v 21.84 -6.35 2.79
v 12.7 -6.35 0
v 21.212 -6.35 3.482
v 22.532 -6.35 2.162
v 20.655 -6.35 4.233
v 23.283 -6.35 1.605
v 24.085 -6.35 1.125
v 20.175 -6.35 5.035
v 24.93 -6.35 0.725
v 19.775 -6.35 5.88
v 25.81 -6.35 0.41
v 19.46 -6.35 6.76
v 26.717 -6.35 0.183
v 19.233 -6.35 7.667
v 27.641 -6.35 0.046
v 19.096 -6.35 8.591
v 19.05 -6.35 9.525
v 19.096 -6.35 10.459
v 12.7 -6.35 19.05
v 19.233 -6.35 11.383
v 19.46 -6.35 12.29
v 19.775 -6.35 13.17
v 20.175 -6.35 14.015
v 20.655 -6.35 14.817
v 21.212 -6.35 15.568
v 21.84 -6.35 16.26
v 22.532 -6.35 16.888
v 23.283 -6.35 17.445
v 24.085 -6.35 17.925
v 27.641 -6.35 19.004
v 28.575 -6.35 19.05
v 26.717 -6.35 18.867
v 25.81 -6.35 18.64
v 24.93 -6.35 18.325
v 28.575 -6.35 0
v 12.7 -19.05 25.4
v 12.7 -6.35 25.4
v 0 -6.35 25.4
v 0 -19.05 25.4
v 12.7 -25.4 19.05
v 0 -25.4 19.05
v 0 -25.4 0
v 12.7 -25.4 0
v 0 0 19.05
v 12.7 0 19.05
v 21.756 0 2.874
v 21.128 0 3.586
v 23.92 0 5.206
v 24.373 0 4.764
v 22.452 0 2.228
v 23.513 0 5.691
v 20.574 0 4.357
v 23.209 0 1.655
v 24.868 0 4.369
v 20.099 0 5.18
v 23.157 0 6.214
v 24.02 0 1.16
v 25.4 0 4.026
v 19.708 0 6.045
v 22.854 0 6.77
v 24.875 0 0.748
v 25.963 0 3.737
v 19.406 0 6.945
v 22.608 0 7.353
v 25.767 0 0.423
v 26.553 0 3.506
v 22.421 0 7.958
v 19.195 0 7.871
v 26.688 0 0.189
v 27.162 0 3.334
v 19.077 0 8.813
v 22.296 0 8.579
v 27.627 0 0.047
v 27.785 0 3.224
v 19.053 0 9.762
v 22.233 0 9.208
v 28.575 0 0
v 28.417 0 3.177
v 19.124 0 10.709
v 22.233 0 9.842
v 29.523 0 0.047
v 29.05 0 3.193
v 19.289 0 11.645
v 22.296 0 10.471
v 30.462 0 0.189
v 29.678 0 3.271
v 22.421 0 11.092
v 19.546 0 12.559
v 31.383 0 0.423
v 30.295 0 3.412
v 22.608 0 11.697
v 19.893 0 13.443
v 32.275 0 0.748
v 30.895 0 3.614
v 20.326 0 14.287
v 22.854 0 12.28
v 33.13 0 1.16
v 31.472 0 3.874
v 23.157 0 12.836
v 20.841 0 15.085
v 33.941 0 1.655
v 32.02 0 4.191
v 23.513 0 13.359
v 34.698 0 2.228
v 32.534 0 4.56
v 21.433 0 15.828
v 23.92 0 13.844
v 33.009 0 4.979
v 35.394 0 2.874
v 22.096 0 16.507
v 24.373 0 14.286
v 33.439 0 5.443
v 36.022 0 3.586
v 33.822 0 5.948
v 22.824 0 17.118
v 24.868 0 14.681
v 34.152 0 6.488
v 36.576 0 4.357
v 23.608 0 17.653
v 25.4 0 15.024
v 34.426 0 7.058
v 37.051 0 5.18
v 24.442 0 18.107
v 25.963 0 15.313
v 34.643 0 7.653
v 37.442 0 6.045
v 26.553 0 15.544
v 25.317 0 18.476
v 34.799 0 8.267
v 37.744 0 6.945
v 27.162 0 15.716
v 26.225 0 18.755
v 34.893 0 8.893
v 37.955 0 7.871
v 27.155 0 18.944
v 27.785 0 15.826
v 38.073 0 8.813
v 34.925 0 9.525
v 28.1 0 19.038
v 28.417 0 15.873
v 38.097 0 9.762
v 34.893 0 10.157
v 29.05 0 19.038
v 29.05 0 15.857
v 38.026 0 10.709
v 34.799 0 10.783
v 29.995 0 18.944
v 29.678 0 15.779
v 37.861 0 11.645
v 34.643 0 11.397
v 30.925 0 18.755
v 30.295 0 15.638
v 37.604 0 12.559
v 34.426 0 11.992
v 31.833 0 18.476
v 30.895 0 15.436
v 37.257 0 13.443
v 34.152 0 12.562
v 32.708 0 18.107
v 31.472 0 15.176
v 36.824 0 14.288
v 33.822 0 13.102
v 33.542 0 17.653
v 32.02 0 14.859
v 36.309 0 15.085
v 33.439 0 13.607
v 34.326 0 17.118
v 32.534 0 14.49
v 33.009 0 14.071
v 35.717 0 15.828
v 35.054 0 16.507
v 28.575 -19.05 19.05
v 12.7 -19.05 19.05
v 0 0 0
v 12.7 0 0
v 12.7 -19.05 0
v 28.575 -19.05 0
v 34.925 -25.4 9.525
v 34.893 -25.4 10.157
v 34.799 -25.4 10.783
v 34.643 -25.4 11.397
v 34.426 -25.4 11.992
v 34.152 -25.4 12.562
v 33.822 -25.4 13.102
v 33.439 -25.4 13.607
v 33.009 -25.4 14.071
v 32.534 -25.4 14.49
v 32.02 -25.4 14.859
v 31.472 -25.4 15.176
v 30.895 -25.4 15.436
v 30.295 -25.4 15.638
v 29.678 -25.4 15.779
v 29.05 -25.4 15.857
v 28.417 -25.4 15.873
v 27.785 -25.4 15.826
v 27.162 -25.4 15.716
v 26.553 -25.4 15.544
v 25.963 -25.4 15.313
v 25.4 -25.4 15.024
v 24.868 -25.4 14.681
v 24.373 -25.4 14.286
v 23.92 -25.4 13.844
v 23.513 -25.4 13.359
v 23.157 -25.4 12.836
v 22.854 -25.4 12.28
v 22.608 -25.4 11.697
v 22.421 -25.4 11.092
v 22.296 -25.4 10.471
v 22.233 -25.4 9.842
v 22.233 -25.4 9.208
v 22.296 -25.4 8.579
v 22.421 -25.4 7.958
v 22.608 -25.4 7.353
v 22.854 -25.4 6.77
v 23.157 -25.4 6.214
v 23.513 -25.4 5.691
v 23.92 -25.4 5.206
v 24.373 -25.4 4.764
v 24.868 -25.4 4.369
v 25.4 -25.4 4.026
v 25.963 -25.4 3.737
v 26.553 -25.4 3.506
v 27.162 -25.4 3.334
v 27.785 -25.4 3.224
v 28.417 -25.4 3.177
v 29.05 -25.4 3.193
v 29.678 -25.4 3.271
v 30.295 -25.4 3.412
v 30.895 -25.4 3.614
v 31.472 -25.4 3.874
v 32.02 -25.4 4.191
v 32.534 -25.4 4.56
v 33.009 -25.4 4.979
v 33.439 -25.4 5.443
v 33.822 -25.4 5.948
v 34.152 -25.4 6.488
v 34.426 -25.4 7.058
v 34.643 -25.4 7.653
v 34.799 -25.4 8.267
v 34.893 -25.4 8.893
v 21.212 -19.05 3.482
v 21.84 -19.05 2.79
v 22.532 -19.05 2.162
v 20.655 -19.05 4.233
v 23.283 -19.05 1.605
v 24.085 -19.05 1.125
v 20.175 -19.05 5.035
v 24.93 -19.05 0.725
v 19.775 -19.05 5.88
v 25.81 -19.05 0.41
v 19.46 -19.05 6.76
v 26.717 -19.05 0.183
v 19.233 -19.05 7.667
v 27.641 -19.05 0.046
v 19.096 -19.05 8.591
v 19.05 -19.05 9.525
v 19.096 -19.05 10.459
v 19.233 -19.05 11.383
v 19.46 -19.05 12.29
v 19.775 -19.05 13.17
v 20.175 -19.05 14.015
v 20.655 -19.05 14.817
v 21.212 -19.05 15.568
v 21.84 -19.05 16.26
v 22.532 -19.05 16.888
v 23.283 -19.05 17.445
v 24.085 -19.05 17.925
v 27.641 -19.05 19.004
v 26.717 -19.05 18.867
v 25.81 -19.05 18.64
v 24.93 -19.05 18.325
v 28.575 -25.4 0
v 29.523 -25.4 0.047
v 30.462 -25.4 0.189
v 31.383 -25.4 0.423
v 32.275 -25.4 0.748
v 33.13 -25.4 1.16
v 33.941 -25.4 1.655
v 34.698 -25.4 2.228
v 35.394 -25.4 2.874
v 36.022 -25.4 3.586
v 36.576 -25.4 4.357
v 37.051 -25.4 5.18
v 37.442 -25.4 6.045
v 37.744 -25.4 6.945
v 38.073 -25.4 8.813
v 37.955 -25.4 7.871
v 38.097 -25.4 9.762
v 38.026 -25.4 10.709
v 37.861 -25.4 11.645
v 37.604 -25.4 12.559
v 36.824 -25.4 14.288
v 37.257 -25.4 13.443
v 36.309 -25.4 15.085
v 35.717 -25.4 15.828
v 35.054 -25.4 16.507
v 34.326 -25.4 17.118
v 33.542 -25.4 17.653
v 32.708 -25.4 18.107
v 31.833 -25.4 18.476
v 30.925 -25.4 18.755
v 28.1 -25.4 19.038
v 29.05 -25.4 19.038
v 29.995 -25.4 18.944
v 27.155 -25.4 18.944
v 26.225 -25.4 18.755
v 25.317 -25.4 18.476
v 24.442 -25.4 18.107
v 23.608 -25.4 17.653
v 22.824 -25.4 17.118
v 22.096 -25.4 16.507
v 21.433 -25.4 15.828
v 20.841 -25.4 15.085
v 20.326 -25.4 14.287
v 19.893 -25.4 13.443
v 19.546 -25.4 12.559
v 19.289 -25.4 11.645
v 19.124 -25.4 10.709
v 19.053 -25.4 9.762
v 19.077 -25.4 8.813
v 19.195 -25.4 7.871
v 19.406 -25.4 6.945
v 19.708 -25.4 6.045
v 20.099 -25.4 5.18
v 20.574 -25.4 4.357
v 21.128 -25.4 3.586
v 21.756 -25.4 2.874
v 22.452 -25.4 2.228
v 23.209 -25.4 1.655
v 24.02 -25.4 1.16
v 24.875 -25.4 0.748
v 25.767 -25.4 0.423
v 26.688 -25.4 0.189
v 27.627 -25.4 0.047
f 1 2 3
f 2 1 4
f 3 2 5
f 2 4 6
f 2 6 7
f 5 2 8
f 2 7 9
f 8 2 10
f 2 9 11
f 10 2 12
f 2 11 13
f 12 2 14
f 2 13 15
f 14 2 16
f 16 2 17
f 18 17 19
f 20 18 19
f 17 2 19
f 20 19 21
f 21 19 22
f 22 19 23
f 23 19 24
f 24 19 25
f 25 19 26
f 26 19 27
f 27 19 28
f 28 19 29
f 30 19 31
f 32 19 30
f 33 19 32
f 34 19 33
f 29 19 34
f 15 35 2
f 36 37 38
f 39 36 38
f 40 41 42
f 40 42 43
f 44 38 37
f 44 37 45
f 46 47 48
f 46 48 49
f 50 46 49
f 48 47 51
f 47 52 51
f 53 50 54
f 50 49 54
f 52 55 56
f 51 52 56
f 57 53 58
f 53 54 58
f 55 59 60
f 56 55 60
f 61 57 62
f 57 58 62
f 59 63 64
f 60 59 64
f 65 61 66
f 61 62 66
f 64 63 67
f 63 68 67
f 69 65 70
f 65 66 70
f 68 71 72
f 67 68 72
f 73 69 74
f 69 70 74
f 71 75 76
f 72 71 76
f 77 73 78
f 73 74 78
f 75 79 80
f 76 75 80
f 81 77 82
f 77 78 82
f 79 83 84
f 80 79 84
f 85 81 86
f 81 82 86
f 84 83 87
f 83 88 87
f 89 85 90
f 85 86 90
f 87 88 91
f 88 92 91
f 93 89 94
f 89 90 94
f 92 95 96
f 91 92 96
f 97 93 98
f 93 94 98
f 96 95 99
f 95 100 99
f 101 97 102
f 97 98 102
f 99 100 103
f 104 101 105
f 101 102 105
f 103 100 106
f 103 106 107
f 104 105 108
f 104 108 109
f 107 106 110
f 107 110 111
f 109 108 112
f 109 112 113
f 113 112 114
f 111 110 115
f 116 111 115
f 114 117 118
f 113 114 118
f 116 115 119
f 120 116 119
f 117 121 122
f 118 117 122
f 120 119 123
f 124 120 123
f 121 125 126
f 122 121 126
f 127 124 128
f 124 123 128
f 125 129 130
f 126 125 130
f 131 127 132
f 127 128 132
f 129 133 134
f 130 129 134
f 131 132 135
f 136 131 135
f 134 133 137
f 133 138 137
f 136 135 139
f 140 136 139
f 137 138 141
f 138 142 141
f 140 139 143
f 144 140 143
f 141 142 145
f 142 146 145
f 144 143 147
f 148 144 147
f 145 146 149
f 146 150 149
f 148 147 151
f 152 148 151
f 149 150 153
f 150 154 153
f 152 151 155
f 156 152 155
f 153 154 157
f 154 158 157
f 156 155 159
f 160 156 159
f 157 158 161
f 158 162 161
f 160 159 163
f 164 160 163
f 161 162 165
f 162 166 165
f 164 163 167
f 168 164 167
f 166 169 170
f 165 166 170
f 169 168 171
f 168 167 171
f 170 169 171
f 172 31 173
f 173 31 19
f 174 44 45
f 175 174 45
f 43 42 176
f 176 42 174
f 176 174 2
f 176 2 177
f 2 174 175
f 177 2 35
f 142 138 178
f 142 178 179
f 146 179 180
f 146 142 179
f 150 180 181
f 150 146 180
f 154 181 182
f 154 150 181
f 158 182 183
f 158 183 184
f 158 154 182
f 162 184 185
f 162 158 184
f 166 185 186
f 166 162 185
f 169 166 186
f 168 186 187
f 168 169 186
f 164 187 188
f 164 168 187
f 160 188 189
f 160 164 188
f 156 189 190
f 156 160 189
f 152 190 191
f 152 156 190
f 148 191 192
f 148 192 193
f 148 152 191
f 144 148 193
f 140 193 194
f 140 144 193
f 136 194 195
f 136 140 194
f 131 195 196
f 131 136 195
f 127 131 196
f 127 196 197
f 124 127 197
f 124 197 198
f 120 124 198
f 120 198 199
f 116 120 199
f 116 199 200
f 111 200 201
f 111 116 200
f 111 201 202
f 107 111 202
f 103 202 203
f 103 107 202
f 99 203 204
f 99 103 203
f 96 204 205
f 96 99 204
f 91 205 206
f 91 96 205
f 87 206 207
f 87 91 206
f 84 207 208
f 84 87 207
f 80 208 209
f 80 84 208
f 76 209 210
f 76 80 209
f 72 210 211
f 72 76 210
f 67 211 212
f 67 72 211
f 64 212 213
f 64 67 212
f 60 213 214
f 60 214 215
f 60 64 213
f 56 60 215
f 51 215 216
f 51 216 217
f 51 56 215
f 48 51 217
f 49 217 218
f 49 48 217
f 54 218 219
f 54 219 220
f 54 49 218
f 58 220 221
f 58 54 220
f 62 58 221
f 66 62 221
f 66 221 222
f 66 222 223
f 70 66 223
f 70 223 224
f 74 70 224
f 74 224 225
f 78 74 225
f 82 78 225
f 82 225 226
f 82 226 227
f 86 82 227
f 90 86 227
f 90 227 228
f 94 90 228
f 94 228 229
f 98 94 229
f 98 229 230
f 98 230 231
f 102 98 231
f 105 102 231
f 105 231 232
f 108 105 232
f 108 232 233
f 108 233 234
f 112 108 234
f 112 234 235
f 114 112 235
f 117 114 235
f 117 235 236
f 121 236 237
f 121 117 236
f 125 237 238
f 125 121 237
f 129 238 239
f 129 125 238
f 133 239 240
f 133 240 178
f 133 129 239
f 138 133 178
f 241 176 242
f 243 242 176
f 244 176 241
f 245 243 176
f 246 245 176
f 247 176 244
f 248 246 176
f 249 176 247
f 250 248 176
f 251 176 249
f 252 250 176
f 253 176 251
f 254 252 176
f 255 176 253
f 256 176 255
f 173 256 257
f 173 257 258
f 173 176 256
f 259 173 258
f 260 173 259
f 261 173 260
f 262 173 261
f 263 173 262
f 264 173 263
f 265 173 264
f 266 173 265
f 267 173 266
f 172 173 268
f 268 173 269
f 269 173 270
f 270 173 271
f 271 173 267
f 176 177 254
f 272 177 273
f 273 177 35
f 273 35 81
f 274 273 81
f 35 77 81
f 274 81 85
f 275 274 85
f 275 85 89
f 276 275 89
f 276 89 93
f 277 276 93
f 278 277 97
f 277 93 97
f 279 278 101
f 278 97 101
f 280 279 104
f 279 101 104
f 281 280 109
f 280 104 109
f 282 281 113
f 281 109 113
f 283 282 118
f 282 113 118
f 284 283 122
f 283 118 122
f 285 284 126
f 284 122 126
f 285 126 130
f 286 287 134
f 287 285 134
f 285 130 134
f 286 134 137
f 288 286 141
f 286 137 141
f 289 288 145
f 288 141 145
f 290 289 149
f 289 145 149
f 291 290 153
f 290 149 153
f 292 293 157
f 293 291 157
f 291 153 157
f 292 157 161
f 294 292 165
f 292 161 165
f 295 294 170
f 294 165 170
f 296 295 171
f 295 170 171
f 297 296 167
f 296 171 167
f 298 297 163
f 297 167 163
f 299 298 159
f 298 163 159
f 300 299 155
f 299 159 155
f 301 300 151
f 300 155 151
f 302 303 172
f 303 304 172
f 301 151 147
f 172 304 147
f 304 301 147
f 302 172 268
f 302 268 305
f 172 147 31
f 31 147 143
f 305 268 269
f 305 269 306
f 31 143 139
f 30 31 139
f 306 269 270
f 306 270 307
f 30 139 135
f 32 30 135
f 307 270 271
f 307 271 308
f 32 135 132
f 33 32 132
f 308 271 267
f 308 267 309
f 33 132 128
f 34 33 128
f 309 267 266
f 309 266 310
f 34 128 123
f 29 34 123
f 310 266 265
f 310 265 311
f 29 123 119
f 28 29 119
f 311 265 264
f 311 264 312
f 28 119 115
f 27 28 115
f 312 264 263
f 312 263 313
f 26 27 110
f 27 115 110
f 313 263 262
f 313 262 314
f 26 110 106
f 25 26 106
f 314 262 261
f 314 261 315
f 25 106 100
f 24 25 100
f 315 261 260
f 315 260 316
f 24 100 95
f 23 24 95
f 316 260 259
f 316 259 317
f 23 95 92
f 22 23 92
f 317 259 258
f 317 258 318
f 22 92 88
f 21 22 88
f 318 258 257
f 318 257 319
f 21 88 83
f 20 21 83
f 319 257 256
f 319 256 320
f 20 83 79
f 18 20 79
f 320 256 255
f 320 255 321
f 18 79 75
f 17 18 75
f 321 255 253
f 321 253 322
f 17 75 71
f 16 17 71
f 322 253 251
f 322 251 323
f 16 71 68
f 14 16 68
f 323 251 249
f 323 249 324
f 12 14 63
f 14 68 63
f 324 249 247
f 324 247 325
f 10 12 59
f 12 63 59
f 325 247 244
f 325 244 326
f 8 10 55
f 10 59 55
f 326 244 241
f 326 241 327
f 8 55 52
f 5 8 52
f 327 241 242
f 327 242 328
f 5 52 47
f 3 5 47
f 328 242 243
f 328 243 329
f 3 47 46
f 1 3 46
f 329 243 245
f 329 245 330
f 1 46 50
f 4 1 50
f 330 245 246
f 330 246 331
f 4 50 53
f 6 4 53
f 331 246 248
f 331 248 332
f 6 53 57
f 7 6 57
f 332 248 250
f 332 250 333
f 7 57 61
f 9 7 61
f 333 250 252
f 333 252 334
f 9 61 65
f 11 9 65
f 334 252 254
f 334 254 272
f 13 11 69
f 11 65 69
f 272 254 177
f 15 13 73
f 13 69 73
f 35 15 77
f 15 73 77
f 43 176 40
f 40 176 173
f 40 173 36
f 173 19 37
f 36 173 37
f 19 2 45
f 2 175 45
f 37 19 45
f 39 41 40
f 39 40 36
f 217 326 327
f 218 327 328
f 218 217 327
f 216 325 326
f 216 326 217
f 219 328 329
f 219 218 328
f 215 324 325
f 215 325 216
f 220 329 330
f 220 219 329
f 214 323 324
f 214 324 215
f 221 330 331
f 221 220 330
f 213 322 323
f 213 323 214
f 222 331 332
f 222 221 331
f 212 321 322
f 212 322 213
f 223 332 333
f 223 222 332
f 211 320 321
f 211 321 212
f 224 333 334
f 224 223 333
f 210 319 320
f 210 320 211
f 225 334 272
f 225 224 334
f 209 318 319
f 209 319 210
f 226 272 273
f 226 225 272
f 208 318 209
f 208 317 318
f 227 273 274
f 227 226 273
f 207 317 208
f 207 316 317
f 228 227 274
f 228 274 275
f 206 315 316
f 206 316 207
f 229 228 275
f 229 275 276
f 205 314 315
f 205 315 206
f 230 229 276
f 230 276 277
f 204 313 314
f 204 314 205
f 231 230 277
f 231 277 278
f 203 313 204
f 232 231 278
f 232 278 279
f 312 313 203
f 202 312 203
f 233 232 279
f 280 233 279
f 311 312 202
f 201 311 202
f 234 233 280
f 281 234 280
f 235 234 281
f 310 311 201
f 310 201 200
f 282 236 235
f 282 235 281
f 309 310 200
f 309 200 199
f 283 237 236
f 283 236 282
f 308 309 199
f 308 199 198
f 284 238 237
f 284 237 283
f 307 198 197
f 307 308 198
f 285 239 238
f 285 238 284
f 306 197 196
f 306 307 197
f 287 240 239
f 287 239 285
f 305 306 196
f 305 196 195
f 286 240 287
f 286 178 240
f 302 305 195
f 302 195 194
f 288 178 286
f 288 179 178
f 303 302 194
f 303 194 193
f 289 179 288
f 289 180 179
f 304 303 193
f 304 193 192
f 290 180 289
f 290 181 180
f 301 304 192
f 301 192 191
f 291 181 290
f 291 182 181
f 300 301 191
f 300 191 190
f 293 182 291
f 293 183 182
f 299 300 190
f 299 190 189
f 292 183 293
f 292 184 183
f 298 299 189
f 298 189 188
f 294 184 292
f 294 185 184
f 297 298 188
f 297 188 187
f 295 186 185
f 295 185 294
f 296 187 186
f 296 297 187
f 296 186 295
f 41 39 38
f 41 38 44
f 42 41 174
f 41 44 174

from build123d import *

# Parameters (mm, degrees)
F0_R     = 6.35
F1_DEPTH = 25.4
F3_DEPTH = 6.35
F5_DEPTH = 6.35
F7_DEPTH = 25.4
F9_DEPTH = 25.4


# Not quite as in the source:
# - a pattern or mirror of a feature is missing from the dataset's text; its kind, count and spacing are read off the source's solid
# - a feature names something its author has since deleted; it is built from what else it names


with BuildPart() as f1:
    # F0 (on Front) → F1 (new body)
    with BuildSketch(Plane.XZ):
        Polygon((0, 25.4), (0, 0), (12.7, 0), (12.7, 19.05), (12.7, 25.4), align=None)
        with BuildLine():
            Line((12.7, 19.05), (12.7, 0))
            Line((12.7, 0), (28.575, 0))
            ThreePointArc((28.575, 0), (19.05, 9.525), (28.575, 19.05))
            Line((28.575, 19.05), (12.7, 19.05))
        make_face()
        with BuildLine():
            ThreePointArc((28.575, 19.05), (19.05, 9.525), (28.575, 0))
            ThreePointArc((28.575, 0), (35.3101920908, 2.7898079092), (38.1, 9.525))
            ThreePointArc((38.1, 9.525), (35.3101920908, 16.2601920908), (28.575, 19.05))
        make_face()
        with Locations((28.575, 9.525)):
            Circle(F0_R, mode=Mode.SUBTRACT)
    extrude(amount=F1_DEPTH)

    # F2 (on face) → F3 (cut)
    with BuildSketch(Plane.XZ):
        with BuildLine():
            Line((28.575, 19.05), (12.7, 19.05))
            Line((12.7, 19.05), (12.7, 0))
            Line((12.7, 0), (28.575, 0))
            ThreePointArc((28.575, 0), (19.05, 9.525), (28.575, 19.05))
        make_face()
    extrude(amount=-F3_DEPTH, mode=Mode.SUBTRACT)

    # F4 (on Front) → F5 (cut)
    with BuildSketch(Plane.XZ):
        with BuildLine():
            Line((28.575, 19.05), (12.7, 19.05))
            Line((12.7, 19.05), (12.7, 0))
            Line((12.7, 0), (28.575, 0))
            ThreePointArc((28.575, 0), (19.05, 9.525), (28.575, 19.05))
        make_face()
    f5 = extrude(amount=F5_DEPTH, mode=Mode.SUBTRACT)

    # F5_copies: F5 across plane
    add(f5.mirror(Plane(origin=(0, -12.7, 0), x_dir=(0, 0, -1), z_dir=(0, -1, 0))), mode=Mode.SUBTRACT)

    # F6 (on Right) → F7 (cut)
    with BuildSketch(Plane.YZ):
        Polygon((-25.4, 19.05), (-19.05, 25.4), (-25.4, 25.4), align=None)
    extrude(amount=F7_DEPTH, mode=Mode.SUBTRACT)

    # F8 (on Right) → F9 (cut)
    with BuildSketch(Plane.YZ):
        Polygon((0, 19.05), (0, 25.4), (-6.35, 25.4), align=None)
    extrude(amount=F9_DEPTH, mode=Mode.SUBTRACT)


solid = f1.part
